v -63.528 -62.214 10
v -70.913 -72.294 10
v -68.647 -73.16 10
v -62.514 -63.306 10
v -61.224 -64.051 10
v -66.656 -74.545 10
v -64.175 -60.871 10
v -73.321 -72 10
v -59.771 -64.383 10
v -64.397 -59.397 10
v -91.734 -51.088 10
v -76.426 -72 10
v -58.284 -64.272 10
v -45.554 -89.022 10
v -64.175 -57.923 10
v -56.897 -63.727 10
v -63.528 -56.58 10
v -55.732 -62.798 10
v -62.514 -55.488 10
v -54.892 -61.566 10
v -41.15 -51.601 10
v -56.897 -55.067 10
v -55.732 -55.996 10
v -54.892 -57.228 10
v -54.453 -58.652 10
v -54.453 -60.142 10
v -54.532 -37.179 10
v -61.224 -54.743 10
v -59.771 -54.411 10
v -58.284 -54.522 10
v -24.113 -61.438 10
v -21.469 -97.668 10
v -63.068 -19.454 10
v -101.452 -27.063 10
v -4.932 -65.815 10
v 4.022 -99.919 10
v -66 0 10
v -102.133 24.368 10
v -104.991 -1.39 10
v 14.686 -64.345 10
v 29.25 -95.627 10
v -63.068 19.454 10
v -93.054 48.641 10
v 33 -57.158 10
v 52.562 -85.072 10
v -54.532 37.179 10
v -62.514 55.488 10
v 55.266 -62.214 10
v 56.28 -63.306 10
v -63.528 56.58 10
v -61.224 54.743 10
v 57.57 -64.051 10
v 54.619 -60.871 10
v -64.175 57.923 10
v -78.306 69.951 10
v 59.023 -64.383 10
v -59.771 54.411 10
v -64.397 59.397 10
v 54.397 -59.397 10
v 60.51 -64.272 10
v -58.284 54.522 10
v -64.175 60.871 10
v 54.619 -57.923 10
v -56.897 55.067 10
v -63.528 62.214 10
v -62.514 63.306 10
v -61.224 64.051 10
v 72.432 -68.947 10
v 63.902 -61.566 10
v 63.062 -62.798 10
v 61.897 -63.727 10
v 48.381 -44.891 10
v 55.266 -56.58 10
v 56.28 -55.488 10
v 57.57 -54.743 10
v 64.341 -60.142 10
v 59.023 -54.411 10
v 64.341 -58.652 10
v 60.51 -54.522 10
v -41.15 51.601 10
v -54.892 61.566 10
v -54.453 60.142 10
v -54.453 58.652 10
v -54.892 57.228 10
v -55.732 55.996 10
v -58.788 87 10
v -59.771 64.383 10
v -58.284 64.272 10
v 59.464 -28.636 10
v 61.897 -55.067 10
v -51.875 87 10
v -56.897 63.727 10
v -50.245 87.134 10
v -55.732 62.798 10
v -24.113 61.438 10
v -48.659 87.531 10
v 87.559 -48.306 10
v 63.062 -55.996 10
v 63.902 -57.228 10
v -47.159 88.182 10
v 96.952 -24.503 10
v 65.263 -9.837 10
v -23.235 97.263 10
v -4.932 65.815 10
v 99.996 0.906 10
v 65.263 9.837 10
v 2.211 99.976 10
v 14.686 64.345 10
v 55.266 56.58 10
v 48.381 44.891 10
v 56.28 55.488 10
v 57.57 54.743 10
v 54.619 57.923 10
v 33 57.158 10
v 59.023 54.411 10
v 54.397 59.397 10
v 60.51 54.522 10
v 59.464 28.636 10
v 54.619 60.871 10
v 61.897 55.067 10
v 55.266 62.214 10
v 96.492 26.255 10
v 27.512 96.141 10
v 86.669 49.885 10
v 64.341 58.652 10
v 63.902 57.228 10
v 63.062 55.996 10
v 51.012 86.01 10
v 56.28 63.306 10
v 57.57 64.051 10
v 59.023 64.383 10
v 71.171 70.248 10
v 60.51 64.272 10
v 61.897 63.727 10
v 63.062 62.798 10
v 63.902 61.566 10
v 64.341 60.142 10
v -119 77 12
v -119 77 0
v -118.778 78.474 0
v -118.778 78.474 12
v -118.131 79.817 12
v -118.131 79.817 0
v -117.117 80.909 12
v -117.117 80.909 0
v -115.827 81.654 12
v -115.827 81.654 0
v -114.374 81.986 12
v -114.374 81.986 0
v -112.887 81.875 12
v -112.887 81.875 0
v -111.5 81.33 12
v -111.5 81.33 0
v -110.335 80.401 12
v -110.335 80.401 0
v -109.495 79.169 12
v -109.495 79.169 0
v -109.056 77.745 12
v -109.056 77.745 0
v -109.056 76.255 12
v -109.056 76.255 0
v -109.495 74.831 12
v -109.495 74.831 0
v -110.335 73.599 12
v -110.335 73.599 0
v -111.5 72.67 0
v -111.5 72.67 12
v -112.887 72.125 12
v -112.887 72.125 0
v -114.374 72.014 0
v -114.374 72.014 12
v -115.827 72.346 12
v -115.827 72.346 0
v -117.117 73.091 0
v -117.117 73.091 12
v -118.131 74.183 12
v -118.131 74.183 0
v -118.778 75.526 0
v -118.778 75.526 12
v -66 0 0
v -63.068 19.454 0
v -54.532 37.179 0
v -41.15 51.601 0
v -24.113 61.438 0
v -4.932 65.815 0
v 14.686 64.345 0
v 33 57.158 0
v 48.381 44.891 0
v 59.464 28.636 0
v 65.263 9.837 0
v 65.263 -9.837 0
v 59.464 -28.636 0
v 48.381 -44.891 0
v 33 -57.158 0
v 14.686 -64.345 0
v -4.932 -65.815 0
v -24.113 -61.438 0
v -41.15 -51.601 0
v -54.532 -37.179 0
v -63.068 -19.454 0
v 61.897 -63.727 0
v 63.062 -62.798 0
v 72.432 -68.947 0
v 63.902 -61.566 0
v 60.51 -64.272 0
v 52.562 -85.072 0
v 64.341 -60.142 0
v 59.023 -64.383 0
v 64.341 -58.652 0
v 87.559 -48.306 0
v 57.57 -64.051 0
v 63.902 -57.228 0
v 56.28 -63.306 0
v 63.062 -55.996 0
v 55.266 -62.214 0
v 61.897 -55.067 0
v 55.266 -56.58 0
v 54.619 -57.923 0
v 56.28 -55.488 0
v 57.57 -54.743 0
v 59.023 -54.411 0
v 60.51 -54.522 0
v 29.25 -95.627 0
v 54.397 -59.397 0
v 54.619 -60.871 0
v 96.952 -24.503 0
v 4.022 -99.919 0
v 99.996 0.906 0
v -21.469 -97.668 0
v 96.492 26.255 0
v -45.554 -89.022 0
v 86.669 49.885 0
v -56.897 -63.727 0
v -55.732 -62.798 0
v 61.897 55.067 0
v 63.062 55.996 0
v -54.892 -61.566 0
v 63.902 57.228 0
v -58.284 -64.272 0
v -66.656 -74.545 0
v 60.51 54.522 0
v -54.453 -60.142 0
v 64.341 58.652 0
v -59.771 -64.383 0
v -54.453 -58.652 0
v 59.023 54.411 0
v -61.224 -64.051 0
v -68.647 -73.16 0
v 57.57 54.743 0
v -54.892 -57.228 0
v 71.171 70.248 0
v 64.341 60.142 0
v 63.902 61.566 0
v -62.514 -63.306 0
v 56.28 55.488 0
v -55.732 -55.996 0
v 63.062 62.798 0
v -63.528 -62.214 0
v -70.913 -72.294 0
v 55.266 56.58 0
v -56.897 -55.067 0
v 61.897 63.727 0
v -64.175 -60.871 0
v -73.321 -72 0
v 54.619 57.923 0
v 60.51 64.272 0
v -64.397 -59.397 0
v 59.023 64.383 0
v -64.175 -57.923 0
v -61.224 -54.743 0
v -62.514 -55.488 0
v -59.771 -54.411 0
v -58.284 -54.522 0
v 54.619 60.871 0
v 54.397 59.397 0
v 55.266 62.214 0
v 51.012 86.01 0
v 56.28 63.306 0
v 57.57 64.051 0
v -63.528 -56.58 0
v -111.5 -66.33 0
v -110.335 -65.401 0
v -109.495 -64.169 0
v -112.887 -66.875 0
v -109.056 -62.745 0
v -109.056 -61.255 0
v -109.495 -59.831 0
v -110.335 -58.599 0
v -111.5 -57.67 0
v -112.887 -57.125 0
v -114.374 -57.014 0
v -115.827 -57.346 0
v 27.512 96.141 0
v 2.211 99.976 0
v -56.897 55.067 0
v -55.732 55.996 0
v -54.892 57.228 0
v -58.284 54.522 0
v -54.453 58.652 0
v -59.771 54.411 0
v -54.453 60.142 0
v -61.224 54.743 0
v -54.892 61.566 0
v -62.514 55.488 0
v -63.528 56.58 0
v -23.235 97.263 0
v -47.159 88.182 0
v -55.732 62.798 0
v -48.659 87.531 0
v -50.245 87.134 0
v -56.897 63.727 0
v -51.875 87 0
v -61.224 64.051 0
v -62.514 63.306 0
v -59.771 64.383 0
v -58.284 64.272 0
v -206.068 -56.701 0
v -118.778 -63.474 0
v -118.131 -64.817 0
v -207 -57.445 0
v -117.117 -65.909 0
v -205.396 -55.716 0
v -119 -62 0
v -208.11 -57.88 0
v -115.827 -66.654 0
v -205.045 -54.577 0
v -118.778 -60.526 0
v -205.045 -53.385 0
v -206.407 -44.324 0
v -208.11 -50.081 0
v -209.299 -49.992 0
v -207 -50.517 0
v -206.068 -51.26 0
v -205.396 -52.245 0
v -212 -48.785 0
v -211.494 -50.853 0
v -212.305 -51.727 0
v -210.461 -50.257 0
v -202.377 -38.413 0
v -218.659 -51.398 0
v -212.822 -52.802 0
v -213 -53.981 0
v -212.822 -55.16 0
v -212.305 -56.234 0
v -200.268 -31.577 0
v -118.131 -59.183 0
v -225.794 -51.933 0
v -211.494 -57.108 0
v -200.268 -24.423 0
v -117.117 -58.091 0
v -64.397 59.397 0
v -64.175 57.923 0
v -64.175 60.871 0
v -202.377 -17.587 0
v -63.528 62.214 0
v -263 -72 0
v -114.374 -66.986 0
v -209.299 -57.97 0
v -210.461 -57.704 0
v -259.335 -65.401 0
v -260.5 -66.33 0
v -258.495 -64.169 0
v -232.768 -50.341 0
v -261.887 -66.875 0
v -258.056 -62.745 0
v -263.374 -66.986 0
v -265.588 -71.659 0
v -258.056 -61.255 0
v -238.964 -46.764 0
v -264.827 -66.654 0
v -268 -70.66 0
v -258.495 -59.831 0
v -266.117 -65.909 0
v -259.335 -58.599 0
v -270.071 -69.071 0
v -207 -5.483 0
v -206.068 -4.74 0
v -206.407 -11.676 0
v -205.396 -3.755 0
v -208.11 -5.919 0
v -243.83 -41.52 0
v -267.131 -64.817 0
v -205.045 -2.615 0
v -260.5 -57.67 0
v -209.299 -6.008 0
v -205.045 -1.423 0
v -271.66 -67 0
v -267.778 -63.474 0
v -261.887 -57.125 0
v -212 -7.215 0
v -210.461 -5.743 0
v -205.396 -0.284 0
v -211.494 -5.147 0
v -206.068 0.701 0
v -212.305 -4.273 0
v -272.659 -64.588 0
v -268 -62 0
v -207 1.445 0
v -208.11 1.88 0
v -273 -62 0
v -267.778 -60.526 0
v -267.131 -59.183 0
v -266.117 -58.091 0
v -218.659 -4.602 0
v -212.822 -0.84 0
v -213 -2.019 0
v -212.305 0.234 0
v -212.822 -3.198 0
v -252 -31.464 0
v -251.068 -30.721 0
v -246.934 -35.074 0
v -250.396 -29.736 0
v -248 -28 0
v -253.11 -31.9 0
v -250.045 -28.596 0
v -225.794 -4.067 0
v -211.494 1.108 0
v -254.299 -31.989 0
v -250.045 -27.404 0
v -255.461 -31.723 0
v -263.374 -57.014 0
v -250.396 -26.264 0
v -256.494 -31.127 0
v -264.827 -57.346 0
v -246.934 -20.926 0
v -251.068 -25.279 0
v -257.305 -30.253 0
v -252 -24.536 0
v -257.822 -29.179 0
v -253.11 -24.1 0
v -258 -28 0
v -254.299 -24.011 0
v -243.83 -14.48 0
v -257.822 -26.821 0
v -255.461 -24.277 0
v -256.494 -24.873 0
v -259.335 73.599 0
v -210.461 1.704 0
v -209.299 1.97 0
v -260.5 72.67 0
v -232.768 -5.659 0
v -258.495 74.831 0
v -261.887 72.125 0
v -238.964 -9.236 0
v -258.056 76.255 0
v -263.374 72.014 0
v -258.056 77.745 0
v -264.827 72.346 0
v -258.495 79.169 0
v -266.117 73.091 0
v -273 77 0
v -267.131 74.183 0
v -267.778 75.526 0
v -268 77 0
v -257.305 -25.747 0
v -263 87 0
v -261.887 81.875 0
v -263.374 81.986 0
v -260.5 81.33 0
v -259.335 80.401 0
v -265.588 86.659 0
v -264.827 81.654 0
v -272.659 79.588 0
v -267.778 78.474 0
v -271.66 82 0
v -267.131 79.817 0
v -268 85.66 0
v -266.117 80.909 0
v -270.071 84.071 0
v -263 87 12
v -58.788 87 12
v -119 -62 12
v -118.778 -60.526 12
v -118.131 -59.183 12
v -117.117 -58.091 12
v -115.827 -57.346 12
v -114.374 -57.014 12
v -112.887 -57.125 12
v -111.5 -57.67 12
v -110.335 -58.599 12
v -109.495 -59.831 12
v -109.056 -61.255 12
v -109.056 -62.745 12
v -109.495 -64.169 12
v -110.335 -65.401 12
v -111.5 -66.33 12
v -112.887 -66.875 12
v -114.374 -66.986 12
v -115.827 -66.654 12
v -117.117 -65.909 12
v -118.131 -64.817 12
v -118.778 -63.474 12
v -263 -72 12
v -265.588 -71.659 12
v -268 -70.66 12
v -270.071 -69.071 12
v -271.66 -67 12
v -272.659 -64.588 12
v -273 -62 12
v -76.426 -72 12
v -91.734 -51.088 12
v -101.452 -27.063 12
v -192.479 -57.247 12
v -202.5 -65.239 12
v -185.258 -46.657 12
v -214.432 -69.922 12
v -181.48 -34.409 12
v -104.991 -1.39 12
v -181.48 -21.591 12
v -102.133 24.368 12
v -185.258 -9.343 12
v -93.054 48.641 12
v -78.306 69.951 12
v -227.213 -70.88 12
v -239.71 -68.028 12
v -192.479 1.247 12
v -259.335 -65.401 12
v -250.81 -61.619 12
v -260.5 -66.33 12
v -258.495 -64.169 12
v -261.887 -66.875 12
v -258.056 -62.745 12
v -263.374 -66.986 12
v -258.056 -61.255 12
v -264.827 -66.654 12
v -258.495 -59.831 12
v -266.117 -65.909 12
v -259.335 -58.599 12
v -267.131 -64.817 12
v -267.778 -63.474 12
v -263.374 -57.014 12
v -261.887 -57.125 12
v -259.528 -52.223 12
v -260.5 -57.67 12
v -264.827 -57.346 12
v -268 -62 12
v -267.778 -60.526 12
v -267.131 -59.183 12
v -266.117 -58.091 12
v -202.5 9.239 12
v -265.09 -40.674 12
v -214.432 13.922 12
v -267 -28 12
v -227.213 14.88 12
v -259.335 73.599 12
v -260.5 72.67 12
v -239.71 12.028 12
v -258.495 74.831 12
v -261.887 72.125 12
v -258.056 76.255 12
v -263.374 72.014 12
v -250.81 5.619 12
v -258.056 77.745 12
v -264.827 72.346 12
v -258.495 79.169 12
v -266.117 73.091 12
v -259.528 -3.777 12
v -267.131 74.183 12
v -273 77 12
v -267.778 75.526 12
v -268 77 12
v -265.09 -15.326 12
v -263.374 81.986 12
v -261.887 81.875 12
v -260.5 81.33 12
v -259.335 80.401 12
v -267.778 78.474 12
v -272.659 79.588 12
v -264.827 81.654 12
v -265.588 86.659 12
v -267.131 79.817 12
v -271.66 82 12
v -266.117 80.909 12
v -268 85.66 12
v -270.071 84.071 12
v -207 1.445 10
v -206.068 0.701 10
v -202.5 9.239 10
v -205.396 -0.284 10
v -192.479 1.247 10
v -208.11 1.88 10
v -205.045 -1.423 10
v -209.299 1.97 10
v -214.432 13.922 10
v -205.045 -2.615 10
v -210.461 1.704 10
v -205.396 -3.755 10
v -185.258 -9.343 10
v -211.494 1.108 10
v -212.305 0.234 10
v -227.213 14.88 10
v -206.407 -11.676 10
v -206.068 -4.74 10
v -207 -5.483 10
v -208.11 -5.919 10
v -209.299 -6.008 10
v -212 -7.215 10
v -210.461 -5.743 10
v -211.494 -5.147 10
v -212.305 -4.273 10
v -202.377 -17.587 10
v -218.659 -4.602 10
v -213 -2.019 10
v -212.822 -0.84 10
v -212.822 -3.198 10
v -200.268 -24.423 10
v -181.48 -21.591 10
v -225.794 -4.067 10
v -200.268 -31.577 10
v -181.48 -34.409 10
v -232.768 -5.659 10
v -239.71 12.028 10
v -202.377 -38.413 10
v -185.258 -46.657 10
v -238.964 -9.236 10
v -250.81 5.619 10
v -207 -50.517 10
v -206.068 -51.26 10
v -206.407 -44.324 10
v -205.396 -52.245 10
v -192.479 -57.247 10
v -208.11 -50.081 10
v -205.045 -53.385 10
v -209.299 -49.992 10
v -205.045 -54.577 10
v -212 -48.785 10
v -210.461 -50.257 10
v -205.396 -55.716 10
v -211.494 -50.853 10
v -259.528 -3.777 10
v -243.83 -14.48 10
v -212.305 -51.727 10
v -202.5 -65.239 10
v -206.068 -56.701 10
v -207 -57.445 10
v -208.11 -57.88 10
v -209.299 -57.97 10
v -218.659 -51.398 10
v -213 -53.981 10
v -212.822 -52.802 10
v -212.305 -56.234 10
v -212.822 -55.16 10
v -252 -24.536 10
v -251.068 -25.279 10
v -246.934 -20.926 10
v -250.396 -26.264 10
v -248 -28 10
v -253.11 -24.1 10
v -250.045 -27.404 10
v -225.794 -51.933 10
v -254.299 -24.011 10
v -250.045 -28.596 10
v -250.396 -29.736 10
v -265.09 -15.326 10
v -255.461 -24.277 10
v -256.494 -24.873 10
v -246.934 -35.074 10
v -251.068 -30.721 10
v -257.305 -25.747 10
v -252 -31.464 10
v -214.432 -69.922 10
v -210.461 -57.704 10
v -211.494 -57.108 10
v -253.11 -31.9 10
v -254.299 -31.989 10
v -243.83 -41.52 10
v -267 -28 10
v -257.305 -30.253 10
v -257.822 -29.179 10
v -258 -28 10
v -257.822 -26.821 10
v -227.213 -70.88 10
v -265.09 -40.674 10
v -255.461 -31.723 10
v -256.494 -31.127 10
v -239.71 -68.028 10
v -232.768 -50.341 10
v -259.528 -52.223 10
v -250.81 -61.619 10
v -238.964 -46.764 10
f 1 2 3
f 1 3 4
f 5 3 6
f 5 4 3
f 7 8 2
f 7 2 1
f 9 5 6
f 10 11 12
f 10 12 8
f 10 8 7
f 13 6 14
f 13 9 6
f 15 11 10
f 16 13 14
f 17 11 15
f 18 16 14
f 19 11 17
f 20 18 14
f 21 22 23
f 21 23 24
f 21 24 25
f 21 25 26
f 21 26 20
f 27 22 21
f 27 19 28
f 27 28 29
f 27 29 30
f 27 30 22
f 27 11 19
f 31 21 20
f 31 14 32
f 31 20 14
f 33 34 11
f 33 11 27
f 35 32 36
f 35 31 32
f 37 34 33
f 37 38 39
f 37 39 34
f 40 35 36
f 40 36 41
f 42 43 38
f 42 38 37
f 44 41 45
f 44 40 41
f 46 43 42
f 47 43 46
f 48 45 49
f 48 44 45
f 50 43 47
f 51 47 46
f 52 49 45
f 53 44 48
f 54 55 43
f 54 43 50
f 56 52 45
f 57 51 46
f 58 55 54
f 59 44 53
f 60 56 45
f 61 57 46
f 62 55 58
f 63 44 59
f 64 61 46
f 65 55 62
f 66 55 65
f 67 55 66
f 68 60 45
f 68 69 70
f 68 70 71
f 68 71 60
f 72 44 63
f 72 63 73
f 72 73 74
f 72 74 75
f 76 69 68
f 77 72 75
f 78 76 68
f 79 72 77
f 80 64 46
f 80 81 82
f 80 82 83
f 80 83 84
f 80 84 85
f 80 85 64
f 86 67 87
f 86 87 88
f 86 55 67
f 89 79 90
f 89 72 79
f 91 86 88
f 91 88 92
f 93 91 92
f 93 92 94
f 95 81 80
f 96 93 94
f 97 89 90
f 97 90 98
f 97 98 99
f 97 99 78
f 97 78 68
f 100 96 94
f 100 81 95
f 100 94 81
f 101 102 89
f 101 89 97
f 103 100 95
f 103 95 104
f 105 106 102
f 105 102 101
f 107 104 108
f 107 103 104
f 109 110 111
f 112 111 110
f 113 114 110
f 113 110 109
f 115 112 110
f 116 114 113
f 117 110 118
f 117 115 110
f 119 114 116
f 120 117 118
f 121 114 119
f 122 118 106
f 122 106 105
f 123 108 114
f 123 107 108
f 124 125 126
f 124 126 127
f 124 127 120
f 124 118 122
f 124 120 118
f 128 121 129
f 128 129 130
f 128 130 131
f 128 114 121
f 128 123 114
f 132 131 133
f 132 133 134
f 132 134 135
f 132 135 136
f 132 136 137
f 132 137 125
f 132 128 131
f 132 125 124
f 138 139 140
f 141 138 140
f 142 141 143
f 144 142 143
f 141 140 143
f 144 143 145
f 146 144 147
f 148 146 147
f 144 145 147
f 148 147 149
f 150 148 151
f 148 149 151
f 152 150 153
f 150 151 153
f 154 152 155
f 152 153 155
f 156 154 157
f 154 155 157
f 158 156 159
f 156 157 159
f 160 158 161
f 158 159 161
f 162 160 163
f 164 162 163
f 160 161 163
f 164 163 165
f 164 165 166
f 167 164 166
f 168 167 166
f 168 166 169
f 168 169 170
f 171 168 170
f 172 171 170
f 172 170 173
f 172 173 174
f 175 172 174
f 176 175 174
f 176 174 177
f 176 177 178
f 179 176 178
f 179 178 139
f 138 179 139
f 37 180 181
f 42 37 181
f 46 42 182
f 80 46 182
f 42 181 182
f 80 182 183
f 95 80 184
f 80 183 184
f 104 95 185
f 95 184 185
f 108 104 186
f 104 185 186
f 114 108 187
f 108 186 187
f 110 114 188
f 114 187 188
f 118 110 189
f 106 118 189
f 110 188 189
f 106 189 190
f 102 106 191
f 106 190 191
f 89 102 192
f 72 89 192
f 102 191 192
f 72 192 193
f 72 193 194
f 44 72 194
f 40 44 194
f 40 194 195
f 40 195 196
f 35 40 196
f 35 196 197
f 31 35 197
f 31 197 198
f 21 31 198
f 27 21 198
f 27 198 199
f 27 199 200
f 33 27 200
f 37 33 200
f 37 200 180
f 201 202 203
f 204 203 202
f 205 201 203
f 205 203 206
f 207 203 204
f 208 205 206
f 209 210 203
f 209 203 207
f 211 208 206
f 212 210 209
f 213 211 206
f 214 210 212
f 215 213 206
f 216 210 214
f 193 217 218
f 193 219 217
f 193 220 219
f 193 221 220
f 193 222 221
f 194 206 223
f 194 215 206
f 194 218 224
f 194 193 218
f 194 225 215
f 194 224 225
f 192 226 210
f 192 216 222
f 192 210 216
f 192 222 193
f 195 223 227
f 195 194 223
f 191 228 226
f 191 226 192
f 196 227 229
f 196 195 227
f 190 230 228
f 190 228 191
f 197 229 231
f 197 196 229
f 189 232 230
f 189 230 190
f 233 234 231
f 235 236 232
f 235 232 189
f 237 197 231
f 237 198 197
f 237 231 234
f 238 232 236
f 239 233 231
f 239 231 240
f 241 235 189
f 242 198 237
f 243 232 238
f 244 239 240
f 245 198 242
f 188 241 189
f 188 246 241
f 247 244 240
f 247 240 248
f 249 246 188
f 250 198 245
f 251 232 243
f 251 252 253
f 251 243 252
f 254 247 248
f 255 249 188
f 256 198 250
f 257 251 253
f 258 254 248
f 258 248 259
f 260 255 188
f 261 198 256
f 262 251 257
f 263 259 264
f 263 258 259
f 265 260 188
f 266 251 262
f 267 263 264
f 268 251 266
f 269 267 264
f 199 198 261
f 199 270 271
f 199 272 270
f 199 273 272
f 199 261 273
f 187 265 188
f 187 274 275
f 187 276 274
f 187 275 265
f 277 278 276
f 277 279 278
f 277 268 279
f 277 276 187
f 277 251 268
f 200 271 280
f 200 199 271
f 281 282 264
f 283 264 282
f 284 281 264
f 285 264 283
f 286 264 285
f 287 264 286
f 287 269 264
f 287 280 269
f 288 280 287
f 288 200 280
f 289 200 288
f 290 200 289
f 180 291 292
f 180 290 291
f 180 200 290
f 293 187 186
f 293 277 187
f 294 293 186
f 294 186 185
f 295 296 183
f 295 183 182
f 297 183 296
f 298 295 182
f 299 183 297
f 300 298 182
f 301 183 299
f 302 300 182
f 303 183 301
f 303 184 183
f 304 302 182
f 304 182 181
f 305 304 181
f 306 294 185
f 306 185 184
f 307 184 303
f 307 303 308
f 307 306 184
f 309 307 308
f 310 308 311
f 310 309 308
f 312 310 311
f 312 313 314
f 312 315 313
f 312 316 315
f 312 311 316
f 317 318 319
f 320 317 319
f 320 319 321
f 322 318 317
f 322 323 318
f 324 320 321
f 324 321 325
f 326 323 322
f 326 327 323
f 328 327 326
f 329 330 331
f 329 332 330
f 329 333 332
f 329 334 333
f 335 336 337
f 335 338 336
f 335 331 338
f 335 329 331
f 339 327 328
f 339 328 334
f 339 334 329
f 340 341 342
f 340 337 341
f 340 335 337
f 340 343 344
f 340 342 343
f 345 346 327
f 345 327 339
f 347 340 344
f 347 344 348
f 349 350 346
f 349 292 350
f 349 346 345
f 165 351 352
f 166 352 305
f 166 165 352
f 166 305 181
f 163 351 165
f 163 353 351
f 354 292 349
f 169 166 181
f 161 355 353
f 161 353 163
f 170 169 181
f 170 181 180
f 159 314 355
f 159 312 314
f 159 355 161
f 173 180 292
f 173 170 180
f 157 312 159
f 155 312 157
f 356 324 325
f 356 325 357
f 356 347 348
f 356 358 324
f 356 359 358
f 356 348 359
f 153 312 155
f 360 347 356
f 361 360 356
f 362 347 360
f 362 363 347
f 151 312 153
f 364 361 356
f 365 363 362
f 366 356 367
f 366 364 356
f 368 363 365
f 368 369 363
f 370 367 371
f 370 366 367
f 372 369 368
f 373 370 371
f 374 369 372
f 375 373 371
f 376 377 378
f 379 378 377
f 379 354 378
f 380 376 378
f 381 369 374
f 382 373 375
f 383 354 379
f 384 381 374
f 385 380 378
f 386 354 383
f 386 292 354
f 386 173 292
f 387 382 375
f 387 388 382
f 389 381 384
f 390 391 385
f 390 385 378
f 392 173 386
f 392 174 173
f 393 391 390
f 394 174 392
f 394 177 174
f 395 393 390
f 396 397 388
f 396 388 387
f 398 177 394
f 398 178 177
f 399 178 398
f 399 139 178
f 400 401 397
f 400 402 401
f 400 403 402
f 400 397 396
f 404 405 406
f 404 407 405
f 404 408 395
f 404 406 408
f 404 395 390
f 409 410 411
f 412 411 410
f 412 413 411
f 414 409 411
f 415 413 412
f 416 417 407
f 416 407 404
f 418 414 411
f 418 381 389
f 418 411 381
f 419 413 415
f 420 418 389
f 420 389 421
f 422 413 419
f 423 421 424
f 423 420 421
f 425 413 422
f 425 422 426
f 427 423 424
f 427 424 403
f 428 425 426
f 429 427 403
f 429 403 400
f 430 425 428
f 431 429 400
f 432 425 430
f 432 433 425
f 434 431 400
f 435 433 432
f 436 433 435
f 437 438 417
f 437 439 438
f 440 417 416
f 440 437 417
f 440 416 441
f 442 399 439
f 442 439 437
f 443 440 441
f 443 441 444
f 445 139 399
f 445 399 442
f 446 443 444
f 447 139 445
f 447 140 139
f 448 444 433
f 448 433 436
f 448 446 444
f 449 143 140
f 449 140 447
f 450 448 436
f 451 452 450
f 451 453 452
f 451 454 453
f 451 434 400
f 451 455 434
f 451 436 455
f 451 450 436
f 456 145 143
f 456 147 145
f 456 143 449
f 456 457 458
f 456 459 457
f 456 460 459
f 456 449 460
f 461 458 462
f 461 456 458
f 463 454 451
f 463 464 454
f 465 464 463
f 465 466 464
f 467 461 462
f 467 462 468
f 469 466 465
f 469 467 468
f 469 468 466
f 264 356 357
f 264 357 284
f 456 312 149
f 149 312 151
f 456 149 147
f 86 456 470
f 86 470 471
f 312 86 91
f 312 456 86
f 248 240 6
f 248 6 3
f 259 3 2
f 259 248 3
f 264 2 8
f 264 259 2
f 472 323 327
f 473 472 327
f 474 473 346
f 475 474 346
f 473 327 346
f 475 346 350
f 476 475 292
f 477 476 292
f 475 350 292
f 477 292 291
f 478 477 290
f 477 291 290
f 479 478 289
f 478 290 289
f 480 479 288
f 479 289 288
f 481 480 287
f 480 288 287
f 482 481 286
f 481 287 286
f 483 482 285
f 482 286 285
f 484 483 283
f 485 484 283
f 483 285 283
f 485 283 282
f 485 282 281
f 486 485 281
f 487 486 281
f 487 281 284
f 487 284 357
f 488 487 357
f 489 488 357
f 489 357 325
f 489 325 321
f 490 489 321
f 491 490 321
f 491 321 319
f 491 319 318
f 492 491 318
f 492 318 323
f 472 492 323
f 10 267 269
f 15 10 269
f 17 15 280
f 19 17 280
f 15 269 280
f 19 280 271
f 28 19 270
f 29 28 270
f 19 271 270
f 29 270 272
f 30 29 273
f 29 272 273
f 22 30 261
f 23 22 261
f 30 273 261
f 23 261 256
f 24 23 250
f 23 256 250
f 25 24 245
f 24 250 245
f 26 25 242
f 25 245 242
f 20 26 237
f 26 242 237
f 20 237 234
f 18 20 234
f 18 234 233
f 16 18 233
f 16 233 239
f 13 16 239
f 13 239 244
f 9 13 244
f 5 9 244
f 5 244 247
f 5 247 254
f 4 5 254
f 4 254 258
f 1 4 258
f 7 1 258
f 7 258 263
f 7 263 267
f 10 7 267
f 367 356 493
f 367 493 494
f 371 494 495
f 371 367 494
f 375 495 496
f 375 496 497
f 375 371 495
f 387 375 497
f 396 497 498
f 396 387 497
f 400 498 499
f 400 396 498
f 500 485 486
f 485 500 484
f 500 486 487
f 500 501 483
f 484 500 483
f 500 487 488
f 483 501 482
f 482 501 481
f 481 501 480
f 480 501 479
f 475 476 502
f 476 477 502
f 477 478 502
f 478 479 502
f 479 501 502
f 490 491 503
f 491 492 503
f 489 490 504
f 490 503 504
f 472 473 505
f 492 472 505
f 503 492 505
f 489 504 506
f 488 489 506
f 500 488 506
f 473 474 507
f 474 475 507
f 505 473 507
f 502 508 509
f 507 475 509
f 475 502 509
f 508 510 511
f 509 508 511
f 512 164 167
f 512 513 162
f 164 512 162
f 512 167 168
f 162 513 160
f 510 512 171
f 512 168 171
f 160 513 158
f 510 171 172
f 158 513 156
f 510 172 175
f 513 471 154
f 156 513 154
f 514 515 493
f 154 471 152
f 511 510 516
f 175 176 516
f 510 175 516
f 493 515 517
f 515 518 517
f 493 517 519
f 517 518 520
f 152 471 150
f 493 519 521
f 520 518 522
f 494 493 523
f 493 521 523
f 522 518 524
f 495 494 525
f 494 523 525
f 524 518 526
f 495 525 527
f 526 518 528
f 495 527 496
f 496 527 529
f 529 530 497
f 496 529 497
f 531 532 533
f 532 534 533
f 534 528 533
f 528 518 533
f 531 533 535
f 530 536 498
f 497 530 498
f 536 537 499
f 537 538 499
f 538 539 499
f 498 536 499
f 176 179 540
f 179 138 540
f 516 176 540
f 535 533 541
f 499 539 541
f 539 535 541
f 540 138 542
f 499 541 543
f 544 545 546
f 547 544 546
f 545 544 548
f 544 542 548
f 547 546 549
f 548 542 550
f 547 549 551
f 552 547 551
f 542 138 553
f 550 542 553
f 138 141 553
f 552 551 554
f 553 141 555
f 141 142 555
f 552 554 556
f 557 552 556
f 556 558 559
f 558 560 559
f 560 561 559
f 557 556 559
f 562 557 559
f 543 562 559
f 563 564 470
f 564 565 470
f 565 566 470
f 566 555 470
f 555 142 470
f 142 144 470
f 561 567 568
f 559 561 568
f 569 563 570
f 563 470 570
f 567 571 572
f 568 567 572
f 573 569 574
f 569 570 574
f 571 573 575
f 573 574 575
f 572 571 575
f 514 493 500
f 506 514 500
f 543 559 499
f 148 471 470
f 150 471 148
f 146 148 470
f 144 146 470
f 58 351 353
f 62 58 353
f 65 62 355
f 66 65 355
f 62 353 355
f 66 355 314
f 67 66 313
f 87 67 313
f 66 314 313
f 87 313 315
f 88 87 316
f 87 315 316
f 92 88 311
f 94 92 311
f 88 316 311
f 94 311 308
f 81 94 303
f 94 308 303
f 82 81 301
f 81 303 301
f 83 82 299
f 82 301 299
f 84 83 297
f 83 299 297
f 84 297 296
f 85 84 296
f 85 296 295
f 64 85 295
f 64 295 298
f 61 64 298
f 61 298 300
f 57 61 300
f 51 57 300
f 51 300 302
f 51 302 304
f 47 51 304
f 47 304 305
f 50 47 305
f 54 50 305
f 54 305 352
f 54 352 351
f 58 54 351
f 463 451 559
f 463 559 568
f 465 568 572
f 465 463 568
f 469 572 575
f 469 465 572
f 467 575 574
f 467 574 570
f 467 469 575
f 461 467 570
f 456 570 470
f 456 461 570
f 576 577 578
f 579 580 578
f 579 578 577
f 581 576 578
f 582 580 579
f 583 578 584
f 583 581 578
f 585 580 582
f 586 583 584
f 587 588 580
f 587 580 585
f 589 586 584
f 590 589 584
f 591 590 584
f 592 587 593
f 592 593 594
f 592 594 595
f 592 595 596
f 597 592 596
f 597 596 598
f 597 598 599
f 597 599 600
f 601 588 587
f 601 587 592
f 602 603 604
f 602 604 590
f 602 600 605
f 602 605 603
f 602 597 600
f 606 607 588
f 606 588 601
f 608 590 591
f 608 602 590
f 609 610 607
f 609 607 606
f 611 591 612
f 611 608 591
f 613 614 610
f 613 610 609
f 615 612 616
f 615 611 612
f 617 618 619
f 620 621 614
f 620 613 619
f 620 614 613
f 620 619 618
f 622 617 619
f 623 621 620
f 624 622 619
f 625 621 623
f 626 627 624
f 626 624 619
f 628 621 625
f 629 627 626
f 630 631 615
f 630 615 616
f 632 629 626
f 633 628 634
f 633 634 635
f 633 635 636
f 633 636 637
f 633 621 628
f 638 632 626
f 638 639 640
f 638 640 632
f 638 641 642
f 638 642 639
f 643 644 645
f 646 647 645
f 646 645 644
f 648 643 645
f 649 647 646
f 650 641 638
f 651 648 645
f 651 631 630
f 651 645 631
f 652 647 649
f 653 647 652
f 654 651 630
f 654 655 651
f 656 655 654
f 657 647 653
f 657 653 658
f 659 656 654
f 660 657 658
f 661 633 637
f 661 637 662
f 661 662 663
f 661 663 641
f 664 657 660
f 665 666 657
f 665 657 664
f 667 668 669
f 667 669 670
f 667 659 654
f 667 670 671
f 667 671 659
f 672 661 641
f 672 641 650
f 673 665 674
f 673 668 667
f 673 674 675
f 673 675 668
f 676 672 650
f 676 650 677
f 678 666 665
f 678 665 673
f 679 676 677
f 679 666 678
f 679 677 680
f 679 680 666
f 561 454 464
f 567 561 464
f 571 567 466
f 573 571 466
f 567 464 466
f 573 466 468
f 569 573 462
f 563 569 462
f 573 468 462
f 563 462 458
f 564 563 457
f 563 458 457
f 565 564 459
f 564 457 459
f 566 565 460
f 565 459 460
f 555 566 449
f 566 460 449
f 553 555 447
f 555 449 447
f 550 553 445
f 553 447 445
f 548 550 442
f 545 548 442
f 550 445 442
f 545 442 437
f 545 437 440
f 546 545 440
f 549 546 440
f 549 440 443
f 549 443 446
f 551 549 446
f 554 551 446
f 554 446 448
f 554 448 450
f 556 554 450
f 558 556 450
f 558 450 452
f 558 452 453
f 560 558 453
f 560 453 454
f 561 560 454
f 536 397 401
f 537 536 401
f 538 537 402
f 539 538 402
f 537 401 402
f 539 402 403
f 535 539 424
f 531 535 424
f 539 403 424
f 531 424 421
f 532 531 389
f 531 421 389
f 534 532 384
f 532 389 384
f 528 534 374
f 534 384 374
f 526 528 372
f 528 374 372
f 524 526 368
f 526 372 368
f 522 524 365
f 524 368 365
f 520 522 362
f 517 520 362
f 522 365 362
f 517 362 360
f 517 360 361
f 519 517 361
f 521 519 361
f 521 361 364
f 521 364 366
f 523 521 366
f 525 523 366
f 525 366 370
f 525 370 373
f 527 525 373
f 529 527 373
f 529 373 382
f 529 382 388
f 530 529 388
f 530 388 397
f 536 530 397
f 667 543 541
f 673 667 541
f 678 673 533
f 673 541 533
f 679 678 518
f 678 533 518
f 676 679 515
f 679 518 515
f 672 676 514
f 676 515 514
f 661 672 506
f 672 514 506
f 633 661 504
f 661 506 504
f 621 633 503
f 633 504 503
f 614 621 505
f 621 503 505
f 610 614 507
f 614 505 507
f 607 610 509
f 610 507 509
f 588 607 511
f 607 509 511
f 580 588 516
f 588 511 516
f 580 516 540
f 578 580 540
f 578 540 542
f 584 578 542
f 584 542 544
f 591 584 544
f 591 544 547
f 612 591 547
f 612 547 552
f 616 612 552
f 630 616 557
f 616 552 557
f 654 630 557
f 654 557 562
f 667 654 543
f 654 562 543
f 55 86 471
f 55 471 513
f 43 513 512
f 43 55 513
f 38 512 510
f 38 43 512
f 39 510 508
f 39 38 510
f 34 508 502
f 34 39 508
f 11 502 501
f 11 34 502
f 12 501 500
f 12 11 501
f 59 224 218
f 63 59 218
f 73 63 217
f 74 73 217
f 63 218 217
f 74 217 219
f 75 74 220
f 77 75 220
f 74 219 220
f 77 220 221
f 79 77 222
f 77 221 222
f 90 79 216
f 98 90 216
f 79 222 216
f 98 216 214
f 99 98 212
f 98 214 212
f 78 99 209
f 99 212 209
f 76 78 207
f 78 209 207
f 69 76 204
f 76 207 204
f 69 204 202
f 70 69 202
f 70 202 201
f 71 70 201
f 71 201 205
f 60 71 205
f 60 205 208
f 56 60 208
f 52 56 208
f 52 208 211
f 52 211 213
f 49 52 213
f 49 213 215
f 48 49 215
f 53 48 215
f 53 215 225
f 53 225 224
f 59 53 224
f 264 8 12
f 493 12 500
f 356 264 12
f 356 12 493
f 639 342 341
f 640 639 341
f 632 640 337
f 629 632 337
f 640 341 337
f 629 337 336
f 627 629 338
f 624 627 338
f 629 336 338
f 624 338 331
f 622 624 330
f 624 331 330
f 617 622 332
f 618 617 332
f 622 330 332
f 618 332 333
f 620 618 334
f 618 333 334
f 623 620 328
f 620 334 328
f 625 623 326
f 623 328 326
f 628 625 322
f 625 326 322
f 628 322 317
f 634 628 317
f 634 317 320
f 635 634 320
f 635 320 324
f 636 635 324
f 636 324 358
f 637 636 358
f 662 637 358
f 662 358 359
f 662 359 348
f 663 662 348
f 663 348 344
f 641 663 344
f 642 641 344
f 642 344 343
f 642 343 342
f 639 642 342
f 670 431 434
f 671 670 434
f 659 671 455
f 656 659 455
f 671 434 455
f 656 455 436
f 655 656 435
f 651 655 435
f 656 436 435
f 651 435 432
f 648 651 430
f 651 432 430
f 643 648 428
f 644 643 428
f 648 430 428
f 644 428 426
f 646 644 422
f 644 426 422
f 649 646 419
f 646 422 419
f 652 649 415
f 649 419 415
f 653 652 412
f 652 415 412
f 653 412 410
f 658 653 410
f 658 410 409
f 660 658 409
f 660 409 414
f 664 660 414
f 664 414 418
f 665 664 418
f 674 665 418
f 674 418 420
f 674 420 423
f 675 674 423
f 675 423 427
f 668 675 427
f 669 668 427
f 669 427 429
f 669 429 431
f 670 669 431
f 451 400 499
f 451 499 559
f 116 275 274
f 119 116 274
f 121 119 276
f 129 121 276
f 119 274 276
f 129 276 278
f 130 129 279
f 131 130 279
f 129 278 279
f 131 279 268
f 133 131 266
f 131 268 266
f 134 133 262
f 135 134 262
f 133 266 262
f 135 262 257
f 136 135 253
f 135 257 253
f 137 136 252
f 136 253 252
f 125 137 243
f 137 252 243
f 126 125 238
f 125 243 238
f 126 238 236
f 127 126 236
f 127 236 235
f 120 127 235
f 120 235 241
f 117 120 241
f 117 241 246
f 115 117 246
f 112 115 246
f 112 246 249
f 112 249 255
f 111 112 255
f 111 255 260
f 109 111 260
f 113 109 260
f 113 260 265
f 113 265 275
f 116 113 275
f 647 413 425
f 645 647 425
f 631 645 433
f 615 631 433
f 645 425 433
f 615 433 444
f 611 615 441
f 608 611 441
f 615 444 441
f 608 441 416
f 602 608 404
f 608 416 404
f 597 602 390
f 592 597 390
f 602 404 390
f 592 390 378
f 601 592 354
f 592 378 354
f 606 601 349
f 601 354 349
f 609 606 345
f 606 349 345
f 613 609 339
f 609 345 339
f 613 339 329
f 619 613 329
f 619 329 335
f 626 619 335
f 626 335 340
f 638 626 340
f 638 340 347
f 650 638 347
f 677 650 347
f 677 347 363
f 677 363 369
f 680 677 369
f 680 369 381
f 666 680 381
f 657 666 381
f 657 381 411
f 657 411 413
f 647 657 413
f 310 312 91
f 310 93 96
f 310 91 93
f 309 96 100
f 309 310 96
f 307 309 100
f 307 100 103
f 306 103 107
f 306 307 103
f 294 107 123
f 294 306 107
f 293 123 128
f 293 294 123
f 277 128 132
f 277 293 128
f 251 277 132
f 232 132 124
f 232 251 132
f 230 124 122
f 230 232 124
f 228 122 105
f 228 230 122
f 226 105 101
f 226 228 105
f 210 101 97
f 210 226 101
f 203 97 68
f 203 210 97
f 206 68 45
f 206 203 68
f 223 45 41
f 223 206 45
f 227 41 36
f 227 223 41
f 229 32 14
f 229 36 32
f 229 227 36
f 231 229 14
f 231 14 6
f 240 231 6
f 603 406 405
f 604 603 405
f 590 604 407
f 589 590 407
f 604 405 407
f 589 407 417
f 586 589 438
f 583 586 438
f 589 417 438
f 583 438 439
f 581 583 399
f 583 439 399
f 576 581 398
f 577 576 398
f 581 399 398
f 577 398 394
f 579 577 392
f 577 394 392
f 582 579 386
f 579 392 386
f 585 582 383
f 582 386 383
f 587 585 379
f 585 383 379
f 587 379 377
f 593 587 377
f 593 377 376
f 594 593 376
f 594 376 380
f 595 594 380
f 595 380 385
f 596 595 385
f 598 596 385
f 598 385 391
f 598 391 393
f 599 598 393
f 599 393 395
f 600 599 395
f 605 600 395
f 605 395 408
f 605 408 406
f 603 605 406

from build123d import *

# Parameters (mm, degrees)
EXTRUSION1_DEPTH                 = 12
ENL_V_START                      = -2
ENL_V_MAT_EXTRU_1_DEPTH          = 2
ESQUISSE3_R                      = 43
ENL_V_MAT_EXTRU_2_DEPTH          = 2
DIAM_TRE_DU_PER_AGE_M10_0_10_1_D = 10
DIAM_TRE_DU_PER_AGE_M10_0_10_2_D = 10
DIAM_TRE_DU_PER_AGE_M10_0_10_3_D = 10
DIAM_TRE_DU_PER_AGE_M10_0_10_4_D = 10
PER_AGE1_D                       = 132
DIAM_TRE_DU_PER_AGE_M10_0_10_5_D = 10
DIAM_TRE_DU_PER_AGE_M10_0_10_6_D = 10
DIAM_TRE_DU_PER_AGE_M8_0_8_1_D   = 8
DIAM_TRE_DU_PER_AGE_M8_0_8_2_D   = 8
DIAM_TRE_DU_PER_AGE_M8_0_8_3_D   = 8
D_GAGEMENT_M421_D                = 48
DIAM_TRE_DU_PER_AGE_M10_0_10_7_D = 10
DIAM_TRE_DU_PER_AGE_M10_0_10_8_D = 10


with BuildPart() as part:
    # Esquisse1 → Extrusion1 (new body)
    with BuildSketch(Plane(origin=(0, 0, 0), x_dir=(-1, 0, 0), z_dir=(0, 0, -1))):
        with BuildLine():
            Line((73.321211119, -72), (263, -72))
            ThreePointArc((263, -72), (270.071067812, -69.071067812), (273, -62))
            Line((273, -62), (273, 77))
            ThreePointArc((273, 77), (270.071067812, 84.071067812), (263, 87))
            Line((263, 87), (51.874849397, 87))
            ThreePointArc((51.874849397, 87), (49.443987223, 87.29995314), (47.158953998, 88.181818182))
            ThreePointArc((47.158953998, 88.181818182), (-99.289889427, -11.896127843), (66.655646472, -74.545454545))
            ThreePointArc((66.655646472, -74.545454545), (69.753680779, -72.65801267), (73.321211119, -72))
        make_face()
    extrude(amount=-EXTRUSION1_DEPTH)

    # Esquisse2 → Enlèv. mat.-Extru.1 (cut)
    with BuildSketch(Plane.XY.offset(12).offset(ENL_V_START)):
        with BuildLine():
            Line((-51.874849397, 87), (-58.787753827, 87))
            ThreePointArc((-58.787753827, 87), (-104.359806581, 11.577165901), (-76.426435217, -72))
            Line((-76.426435217, -72), (-73.321211119, -72))
            ThreePointArc((-73.321211119, -72), (-69.753680779, -72.65801267), (-66.655646472, -74.545454545))
            ThreePointArc((-66.655646472, -74.545454545), (99.289889427, -11.896127843), (-47.158953998, 88.181818182))
            ThreePointArc((-47.158953998, 88.181818182), (-49.443987223, 87.29995314), (-51.874849397, 87))
        make_face()
    extrude(amount=ENL_V_MAT_EXTRU_1_DEPTH, mode=Mode.SUBTRACT)

    # Esquisse3 → Enlèv. mat.-Extru.2 (cut)
    with BuildSketch(Plane.XY.offset(12)):
        with Locations(Location((-224, -28, 0), (0, 0, 180))):
            Circle(ESQUISSE3_R)
    extrude(amount=-ENL_V_MAT_EXTRU_2_DEPTH, mode=Mode.SUBTRACT)

    # Diamètre du perçage M10.0 (10)1 (through all)
    with Locations(Plane.XY.offset(10)):
        with Locations((59.39696962, -59.39696962)):
            Hole(DIAM_TRE_DU_PER_AGE_M10_0_10_1_D / 2)

    # Diamètre du perçage M10.0 (10)2 (through all)
    with Locations(Plane.XY.offset(10)):
        with Locations((59.39696962, 59.39696962)):
            Hole(DIAM_TRE_DU_PER_AGE_M10_0_10_2_D / 2)

    # Diamètre du perçage M10.0 (10)3 (through all)
    with Locations(Plane.XY.offset(12)):
        with Locations((-114, 77)):
            Hole(DIAM_TRE_DU_PER_AGE_M10_0_10_3_D / 2)

    # Diamètre du perçage M10.0 (10)4 (through all)
    with Locations(Plane.XY.offset(10)):
        with Locations((-59.39696962, 59.39696962)):
            Hole(DIAM_TRE_DU_PER_AGE_M10_0_10_4_D / 2)

    # Perçage1 (through all)
    with Locations(Plane.XY.offset(10)):
        with Locations((0, 0)):
            Hole(PER_AGE1_D / 2)

    # Diamètre du perçage M10.0 (10)5 (through all)
    with Locations(Plane.XY.offset(10)):
        with Locations((-59.39696962, -59.39696962)):
            Hole(DIAM_TRE_DU_PER_AGE_M10_0_10_5_D / 2)

    # Diamètre du perçage M10.0 (10)6 (through all)
    with Locations(Plane.XY.offset(12)):
        with Locations((-114, -62)):
            Hole(DIAM_TRE_DU_PER_AGE_M10_0_10_6_D / 2)

    # Diamètre du perçage M8.0 (8)1 (through all)
    with Locations(Plane.XY.offset(10)):
        with Locations((-209, -2.019237886)):
            Hole(DIAM_TRE_DU_PER_AGE_M8_0_8_1_D / 2)

    # Diamètre du perçage M8.0 (8)2 (through all)
    with Locations(Plane.XY.offset(10)):
        with Locations((-254, -28)):
            Hole(DIAM_TRE_DU_PER_AGE_M8_0_8_2_D / 2)

    # Diamètre du perçage M8.0 (8)3 (through all)
    with Locations(Plane.XY.offset(10)):
        with Locations((-209, -53.980762114)):
            Hole(DIAM_TRE_DU_PER_AGE_M8_0_8_3_D / 2)

    # Dégagement M421 (through all)
    with Locations(Plane.XY.offset(10)):
        with Locations((-224, -28)):
            Hole(D_GAGEMENT_M421_D / 2)

    # Diamètre du perçage M10.0 (10)7 (through all)
    with Locations(Plane.XY.offset(12)):
        with Locations((-263, -62)):
            Hole(DIAM_TRE_DU_PER_AGE_M10_0_10_7_D / 2)

    # Diamètre du perçage M10.0 (10)8 (through all)
    with Locations(Plane.XY.offset(12)):
        with Locations((-263, 77)):
            Hole(DIAM_TRE_DU_PER_AGE_M10_0_10_8_D / 2)


solid = part.part
